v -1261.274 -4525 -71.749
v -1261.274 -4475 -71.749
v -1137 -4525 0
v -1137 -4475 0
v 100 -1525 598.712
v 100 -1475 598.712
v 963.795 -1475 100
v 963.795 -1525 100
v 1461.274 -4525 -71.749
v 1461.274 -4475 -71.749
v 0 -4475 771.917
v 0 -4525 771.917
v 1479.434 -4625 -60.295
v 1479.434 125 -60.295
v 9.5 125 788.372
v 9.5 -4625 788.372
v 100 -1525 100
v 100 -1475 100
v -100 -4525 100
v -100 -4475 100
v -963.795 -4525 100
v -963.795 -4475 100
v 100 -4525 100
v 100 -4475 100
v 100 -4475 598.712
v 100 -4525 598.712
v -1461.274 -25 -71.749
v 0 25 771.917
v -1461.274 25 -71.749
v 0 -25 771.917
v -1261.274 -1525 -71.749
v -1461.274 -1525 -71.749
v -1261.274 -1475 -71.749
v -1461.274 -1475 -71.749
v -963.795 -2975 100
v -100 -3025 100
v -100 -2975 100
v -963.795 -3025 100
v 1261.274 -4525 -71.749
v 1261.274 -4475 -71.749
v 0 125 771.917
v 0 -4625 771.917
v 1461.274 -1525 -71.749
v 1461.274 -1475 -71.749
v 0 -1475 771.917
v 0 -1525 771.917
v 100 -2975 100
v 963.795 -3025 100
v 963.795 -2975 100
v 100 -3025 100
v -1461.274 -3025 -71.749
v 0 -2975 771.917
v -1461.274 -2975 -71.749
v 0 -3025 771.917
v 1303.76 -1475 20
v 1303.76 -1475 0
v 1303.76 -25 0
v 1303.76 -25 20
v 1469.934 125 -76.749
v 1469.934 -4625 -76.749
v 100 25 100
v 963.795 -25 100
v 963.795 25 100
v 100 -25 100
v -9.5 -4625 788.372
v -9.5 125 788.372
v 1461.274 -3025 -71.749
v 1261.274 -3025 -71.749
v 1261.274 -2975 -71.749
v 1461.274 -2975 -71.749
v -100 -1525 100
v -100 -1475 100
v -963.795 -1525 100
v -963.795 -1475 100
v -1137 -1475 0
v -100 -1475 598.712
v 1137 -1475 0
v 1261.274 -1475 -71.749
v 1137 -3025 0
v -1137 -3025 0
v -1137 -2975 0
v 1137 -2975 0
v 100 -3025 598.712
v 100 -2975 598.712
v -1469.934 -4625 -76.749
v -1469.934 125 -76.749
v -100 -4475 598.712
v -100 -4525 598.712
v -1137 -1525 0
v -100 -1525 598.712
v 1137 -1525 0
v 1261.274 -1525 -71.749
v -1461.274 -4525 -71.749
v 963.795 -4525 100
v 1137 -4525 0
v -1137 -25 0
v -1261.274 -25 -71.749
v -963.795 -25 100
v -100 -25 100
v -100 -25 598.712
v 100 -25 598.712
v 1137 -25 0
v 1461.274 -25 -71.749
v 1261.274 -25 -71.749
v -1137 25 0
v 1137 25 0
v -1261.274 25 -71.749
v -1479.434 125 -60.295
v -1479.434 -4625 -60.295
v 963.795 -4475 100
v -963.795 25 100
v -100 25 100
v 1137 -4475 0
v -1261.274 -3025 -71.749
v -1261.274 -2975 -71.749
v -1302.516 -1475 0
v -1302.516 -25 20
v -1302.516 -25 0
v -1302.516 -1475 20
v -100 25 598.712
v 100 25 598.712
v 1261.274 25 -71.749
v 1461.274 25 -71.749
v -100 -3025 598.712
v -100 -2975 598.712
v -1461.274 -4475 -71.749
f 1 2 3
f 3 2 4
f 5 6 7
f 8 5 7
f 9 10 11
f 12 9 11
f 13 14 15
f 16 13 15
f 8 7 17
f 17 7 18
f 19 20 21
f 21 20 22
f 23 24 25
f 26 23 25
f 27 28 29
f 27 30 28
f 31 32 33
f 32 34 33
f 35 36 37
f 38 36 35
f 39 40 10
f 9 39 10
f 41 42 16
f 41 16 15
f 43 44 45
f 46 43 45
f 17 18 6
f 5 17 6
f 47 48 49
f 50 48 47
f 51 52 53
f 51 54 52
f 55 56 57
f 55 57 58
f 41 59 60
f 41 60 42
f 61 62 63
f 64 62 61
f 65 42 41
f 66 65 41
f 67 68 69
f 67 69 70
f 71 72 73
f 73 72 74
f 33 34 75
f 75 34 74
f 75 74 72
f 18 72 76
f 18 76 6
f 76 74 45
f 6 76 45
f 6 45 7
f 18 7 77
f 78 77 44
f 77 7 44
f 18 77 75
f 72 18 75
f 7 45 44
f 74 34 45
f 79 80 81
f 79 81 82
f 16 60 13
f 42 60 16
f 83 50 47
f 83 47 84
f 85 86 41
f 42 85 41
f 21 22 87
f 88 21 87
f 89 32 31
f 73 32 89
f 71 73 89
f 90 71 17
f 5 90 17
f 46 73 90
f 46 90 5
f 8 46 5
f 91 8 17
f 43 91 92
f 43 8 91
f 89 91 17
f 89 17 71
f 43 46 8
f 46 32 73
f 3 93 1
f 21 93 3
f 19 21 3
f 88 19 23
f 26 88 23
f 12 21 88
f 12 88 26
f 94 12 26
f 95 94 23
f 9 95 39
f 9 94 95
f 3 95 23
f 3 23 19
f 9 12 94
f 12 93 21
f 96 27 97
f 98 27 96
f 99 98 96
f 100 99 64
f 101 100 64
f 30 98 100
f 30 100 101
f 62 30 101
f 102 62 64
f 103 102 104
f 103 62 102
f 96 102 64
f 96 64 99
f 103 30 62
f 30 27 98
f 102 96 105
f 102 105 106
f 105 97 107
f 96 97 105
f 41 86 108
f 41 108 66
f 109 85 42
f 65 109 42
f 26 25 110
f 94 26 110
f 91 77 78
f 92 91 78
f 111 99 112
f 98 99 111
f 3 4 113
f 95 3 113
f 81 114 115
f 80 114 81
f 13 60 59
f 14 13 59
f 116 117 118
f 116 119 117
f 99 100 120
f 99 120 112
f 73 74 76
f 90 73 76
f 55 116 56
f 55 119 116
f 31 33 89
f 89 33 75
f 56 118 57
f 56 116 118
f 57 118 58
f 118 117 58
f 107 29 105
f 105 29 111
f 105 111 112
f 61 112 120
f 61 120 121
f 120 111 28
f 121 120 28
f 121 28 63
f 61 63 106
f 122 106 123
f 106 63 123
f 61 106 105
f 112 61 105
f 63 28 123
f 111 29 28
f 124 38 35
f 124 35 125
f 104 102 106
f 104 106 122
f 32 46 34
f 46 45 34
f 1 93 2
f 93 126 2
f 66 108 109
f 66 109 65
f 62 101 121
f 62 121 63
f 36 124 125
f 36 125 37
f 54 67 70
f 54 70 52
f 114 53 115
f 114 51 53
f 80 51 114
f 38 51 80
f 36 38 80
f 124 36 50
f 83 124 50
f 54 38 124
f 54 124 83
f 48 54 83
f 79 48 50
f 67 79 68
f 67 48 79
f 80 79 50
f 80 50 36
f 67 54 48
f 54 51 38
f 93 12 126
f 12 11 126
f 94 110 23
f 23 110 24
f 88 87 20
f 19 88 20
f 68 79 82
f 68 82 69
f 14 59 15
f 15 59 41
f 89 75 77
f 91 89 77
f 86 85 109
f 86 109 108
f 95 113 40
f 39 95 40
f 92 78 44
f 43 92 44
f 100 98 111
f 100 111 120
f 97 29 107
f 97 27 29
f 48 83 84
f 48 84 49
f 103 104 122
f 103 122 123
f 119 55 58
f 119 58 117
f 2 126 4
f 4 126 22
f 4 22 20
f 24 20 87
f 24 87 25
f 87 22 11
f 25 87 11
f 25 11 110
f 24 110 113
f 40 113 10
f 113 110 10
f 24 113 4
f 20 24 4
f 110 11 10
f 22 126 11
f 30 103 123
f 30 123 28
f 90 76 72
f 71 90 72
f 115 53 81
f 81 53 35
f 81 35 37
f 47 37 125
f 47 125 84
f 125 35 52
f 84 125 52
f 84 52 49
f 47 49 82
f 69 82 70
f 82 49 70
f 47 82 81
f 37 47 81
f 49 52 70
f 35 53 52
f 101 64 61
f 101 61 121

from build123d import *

# Parameters (mm, degrees)
F1_DEPTH       = 25
F7_W           = 1697.3335705802
F7_H           = 4750
F8_DEPTH       = 19
F11_DEPTH      = 725
F11_DEPTH_BACK = 725


with BuildPart() as f1:
    # F0 (on Front) → F1 (new body, symmetric)
    with BuildSketch(Plane.XZ):
        Polygon((-1261.2737367808, -71.7494753836), (-1137, 0), (-963.7949192431, 100), (-100, 598.7122291496), (0, 656.4472560686), (0, 771.9173099065), (-1337, 0), (-1461.2737367808, -71.7494753836), align=None)
        Polygon((-963.7949192431, 100), (-1137, 0), (1137, 0), (963.7949192431, 100), (100, 100), (0, 100), (-100, 100), align=None)
        Polygon((963.7949192431, 100), (1137, 0), (1261.2737367808, -71.7494753836), (1461.2737367808, -71.7494753836), (1337, 0), (0, 771.9173099065), (0, 656.4472560686), (100, 598.7122291496), align=None)
        Polygon((0, 656.4472560686), (-100, 598.7122291496), (-100, 100), (0, 100), align=None)
        Polygon((100, 598.7122291496), (0, 656.4472560686), (0, 100), (100, 100), align=None)
    extrude(amount=F1_DEPTH, both=True)


with BuildPart() as f3_1:
    # F3: instance of F1
    add(f1.part.mirror(Plane.XZ.offset(750)))


with BuildPart() as f5_1:
    # F5: instance of F3_1
    add(f3_1.part.mirror(Plane.XZ.offset(2250)))


with BuildPart() as f5_2:
    # F5: instance of F1
    add(f1.part.mirror(Plane.XZ.offset(2250)))


with BuildPart() as f8:
    # F7 (on face) → F8 (new body)
    with BuildSketch(Plane(origin=(-334.25, 0, 578.9379824299), x_dir=(0.8660254038, 0, 0.5), z_dir=(-0.5, 0, 0.8660254038))):
        with Locations((-462.7081303369, -2250)):
            Rectangle(F7_W, F7_H)
    extrude(amount=F8_DEPTH)


with BuildPart() as f9_1:
    # F9: instance of F8
    add(f8.part.mirror(Plane.YZ))


with BuildPart() as f11:
    # F10 (on offset) → F11 (new body, two sides)
    with BuildSketch(Plane.XZ.offset(750)) as f11_sk:
        Polygon((-1302.5155067444, 0), (-1137, 0), (1136.1624002457, 0), (1303.759932518, 0), (1303.759932518, 20), (1136.1624002457, 20), (-1137, 20), (-1302.5155067444, 20), align=None)
    extrude(amount=F11_DEPTH)
    extrude(f11_sk.sketch, amount=-F11_DEPTH_BACK)


solid = Compound([f1.part, f3_1.part, f5_1.part, f5_2.part, f8.part, f9_1.part, f11.part])
